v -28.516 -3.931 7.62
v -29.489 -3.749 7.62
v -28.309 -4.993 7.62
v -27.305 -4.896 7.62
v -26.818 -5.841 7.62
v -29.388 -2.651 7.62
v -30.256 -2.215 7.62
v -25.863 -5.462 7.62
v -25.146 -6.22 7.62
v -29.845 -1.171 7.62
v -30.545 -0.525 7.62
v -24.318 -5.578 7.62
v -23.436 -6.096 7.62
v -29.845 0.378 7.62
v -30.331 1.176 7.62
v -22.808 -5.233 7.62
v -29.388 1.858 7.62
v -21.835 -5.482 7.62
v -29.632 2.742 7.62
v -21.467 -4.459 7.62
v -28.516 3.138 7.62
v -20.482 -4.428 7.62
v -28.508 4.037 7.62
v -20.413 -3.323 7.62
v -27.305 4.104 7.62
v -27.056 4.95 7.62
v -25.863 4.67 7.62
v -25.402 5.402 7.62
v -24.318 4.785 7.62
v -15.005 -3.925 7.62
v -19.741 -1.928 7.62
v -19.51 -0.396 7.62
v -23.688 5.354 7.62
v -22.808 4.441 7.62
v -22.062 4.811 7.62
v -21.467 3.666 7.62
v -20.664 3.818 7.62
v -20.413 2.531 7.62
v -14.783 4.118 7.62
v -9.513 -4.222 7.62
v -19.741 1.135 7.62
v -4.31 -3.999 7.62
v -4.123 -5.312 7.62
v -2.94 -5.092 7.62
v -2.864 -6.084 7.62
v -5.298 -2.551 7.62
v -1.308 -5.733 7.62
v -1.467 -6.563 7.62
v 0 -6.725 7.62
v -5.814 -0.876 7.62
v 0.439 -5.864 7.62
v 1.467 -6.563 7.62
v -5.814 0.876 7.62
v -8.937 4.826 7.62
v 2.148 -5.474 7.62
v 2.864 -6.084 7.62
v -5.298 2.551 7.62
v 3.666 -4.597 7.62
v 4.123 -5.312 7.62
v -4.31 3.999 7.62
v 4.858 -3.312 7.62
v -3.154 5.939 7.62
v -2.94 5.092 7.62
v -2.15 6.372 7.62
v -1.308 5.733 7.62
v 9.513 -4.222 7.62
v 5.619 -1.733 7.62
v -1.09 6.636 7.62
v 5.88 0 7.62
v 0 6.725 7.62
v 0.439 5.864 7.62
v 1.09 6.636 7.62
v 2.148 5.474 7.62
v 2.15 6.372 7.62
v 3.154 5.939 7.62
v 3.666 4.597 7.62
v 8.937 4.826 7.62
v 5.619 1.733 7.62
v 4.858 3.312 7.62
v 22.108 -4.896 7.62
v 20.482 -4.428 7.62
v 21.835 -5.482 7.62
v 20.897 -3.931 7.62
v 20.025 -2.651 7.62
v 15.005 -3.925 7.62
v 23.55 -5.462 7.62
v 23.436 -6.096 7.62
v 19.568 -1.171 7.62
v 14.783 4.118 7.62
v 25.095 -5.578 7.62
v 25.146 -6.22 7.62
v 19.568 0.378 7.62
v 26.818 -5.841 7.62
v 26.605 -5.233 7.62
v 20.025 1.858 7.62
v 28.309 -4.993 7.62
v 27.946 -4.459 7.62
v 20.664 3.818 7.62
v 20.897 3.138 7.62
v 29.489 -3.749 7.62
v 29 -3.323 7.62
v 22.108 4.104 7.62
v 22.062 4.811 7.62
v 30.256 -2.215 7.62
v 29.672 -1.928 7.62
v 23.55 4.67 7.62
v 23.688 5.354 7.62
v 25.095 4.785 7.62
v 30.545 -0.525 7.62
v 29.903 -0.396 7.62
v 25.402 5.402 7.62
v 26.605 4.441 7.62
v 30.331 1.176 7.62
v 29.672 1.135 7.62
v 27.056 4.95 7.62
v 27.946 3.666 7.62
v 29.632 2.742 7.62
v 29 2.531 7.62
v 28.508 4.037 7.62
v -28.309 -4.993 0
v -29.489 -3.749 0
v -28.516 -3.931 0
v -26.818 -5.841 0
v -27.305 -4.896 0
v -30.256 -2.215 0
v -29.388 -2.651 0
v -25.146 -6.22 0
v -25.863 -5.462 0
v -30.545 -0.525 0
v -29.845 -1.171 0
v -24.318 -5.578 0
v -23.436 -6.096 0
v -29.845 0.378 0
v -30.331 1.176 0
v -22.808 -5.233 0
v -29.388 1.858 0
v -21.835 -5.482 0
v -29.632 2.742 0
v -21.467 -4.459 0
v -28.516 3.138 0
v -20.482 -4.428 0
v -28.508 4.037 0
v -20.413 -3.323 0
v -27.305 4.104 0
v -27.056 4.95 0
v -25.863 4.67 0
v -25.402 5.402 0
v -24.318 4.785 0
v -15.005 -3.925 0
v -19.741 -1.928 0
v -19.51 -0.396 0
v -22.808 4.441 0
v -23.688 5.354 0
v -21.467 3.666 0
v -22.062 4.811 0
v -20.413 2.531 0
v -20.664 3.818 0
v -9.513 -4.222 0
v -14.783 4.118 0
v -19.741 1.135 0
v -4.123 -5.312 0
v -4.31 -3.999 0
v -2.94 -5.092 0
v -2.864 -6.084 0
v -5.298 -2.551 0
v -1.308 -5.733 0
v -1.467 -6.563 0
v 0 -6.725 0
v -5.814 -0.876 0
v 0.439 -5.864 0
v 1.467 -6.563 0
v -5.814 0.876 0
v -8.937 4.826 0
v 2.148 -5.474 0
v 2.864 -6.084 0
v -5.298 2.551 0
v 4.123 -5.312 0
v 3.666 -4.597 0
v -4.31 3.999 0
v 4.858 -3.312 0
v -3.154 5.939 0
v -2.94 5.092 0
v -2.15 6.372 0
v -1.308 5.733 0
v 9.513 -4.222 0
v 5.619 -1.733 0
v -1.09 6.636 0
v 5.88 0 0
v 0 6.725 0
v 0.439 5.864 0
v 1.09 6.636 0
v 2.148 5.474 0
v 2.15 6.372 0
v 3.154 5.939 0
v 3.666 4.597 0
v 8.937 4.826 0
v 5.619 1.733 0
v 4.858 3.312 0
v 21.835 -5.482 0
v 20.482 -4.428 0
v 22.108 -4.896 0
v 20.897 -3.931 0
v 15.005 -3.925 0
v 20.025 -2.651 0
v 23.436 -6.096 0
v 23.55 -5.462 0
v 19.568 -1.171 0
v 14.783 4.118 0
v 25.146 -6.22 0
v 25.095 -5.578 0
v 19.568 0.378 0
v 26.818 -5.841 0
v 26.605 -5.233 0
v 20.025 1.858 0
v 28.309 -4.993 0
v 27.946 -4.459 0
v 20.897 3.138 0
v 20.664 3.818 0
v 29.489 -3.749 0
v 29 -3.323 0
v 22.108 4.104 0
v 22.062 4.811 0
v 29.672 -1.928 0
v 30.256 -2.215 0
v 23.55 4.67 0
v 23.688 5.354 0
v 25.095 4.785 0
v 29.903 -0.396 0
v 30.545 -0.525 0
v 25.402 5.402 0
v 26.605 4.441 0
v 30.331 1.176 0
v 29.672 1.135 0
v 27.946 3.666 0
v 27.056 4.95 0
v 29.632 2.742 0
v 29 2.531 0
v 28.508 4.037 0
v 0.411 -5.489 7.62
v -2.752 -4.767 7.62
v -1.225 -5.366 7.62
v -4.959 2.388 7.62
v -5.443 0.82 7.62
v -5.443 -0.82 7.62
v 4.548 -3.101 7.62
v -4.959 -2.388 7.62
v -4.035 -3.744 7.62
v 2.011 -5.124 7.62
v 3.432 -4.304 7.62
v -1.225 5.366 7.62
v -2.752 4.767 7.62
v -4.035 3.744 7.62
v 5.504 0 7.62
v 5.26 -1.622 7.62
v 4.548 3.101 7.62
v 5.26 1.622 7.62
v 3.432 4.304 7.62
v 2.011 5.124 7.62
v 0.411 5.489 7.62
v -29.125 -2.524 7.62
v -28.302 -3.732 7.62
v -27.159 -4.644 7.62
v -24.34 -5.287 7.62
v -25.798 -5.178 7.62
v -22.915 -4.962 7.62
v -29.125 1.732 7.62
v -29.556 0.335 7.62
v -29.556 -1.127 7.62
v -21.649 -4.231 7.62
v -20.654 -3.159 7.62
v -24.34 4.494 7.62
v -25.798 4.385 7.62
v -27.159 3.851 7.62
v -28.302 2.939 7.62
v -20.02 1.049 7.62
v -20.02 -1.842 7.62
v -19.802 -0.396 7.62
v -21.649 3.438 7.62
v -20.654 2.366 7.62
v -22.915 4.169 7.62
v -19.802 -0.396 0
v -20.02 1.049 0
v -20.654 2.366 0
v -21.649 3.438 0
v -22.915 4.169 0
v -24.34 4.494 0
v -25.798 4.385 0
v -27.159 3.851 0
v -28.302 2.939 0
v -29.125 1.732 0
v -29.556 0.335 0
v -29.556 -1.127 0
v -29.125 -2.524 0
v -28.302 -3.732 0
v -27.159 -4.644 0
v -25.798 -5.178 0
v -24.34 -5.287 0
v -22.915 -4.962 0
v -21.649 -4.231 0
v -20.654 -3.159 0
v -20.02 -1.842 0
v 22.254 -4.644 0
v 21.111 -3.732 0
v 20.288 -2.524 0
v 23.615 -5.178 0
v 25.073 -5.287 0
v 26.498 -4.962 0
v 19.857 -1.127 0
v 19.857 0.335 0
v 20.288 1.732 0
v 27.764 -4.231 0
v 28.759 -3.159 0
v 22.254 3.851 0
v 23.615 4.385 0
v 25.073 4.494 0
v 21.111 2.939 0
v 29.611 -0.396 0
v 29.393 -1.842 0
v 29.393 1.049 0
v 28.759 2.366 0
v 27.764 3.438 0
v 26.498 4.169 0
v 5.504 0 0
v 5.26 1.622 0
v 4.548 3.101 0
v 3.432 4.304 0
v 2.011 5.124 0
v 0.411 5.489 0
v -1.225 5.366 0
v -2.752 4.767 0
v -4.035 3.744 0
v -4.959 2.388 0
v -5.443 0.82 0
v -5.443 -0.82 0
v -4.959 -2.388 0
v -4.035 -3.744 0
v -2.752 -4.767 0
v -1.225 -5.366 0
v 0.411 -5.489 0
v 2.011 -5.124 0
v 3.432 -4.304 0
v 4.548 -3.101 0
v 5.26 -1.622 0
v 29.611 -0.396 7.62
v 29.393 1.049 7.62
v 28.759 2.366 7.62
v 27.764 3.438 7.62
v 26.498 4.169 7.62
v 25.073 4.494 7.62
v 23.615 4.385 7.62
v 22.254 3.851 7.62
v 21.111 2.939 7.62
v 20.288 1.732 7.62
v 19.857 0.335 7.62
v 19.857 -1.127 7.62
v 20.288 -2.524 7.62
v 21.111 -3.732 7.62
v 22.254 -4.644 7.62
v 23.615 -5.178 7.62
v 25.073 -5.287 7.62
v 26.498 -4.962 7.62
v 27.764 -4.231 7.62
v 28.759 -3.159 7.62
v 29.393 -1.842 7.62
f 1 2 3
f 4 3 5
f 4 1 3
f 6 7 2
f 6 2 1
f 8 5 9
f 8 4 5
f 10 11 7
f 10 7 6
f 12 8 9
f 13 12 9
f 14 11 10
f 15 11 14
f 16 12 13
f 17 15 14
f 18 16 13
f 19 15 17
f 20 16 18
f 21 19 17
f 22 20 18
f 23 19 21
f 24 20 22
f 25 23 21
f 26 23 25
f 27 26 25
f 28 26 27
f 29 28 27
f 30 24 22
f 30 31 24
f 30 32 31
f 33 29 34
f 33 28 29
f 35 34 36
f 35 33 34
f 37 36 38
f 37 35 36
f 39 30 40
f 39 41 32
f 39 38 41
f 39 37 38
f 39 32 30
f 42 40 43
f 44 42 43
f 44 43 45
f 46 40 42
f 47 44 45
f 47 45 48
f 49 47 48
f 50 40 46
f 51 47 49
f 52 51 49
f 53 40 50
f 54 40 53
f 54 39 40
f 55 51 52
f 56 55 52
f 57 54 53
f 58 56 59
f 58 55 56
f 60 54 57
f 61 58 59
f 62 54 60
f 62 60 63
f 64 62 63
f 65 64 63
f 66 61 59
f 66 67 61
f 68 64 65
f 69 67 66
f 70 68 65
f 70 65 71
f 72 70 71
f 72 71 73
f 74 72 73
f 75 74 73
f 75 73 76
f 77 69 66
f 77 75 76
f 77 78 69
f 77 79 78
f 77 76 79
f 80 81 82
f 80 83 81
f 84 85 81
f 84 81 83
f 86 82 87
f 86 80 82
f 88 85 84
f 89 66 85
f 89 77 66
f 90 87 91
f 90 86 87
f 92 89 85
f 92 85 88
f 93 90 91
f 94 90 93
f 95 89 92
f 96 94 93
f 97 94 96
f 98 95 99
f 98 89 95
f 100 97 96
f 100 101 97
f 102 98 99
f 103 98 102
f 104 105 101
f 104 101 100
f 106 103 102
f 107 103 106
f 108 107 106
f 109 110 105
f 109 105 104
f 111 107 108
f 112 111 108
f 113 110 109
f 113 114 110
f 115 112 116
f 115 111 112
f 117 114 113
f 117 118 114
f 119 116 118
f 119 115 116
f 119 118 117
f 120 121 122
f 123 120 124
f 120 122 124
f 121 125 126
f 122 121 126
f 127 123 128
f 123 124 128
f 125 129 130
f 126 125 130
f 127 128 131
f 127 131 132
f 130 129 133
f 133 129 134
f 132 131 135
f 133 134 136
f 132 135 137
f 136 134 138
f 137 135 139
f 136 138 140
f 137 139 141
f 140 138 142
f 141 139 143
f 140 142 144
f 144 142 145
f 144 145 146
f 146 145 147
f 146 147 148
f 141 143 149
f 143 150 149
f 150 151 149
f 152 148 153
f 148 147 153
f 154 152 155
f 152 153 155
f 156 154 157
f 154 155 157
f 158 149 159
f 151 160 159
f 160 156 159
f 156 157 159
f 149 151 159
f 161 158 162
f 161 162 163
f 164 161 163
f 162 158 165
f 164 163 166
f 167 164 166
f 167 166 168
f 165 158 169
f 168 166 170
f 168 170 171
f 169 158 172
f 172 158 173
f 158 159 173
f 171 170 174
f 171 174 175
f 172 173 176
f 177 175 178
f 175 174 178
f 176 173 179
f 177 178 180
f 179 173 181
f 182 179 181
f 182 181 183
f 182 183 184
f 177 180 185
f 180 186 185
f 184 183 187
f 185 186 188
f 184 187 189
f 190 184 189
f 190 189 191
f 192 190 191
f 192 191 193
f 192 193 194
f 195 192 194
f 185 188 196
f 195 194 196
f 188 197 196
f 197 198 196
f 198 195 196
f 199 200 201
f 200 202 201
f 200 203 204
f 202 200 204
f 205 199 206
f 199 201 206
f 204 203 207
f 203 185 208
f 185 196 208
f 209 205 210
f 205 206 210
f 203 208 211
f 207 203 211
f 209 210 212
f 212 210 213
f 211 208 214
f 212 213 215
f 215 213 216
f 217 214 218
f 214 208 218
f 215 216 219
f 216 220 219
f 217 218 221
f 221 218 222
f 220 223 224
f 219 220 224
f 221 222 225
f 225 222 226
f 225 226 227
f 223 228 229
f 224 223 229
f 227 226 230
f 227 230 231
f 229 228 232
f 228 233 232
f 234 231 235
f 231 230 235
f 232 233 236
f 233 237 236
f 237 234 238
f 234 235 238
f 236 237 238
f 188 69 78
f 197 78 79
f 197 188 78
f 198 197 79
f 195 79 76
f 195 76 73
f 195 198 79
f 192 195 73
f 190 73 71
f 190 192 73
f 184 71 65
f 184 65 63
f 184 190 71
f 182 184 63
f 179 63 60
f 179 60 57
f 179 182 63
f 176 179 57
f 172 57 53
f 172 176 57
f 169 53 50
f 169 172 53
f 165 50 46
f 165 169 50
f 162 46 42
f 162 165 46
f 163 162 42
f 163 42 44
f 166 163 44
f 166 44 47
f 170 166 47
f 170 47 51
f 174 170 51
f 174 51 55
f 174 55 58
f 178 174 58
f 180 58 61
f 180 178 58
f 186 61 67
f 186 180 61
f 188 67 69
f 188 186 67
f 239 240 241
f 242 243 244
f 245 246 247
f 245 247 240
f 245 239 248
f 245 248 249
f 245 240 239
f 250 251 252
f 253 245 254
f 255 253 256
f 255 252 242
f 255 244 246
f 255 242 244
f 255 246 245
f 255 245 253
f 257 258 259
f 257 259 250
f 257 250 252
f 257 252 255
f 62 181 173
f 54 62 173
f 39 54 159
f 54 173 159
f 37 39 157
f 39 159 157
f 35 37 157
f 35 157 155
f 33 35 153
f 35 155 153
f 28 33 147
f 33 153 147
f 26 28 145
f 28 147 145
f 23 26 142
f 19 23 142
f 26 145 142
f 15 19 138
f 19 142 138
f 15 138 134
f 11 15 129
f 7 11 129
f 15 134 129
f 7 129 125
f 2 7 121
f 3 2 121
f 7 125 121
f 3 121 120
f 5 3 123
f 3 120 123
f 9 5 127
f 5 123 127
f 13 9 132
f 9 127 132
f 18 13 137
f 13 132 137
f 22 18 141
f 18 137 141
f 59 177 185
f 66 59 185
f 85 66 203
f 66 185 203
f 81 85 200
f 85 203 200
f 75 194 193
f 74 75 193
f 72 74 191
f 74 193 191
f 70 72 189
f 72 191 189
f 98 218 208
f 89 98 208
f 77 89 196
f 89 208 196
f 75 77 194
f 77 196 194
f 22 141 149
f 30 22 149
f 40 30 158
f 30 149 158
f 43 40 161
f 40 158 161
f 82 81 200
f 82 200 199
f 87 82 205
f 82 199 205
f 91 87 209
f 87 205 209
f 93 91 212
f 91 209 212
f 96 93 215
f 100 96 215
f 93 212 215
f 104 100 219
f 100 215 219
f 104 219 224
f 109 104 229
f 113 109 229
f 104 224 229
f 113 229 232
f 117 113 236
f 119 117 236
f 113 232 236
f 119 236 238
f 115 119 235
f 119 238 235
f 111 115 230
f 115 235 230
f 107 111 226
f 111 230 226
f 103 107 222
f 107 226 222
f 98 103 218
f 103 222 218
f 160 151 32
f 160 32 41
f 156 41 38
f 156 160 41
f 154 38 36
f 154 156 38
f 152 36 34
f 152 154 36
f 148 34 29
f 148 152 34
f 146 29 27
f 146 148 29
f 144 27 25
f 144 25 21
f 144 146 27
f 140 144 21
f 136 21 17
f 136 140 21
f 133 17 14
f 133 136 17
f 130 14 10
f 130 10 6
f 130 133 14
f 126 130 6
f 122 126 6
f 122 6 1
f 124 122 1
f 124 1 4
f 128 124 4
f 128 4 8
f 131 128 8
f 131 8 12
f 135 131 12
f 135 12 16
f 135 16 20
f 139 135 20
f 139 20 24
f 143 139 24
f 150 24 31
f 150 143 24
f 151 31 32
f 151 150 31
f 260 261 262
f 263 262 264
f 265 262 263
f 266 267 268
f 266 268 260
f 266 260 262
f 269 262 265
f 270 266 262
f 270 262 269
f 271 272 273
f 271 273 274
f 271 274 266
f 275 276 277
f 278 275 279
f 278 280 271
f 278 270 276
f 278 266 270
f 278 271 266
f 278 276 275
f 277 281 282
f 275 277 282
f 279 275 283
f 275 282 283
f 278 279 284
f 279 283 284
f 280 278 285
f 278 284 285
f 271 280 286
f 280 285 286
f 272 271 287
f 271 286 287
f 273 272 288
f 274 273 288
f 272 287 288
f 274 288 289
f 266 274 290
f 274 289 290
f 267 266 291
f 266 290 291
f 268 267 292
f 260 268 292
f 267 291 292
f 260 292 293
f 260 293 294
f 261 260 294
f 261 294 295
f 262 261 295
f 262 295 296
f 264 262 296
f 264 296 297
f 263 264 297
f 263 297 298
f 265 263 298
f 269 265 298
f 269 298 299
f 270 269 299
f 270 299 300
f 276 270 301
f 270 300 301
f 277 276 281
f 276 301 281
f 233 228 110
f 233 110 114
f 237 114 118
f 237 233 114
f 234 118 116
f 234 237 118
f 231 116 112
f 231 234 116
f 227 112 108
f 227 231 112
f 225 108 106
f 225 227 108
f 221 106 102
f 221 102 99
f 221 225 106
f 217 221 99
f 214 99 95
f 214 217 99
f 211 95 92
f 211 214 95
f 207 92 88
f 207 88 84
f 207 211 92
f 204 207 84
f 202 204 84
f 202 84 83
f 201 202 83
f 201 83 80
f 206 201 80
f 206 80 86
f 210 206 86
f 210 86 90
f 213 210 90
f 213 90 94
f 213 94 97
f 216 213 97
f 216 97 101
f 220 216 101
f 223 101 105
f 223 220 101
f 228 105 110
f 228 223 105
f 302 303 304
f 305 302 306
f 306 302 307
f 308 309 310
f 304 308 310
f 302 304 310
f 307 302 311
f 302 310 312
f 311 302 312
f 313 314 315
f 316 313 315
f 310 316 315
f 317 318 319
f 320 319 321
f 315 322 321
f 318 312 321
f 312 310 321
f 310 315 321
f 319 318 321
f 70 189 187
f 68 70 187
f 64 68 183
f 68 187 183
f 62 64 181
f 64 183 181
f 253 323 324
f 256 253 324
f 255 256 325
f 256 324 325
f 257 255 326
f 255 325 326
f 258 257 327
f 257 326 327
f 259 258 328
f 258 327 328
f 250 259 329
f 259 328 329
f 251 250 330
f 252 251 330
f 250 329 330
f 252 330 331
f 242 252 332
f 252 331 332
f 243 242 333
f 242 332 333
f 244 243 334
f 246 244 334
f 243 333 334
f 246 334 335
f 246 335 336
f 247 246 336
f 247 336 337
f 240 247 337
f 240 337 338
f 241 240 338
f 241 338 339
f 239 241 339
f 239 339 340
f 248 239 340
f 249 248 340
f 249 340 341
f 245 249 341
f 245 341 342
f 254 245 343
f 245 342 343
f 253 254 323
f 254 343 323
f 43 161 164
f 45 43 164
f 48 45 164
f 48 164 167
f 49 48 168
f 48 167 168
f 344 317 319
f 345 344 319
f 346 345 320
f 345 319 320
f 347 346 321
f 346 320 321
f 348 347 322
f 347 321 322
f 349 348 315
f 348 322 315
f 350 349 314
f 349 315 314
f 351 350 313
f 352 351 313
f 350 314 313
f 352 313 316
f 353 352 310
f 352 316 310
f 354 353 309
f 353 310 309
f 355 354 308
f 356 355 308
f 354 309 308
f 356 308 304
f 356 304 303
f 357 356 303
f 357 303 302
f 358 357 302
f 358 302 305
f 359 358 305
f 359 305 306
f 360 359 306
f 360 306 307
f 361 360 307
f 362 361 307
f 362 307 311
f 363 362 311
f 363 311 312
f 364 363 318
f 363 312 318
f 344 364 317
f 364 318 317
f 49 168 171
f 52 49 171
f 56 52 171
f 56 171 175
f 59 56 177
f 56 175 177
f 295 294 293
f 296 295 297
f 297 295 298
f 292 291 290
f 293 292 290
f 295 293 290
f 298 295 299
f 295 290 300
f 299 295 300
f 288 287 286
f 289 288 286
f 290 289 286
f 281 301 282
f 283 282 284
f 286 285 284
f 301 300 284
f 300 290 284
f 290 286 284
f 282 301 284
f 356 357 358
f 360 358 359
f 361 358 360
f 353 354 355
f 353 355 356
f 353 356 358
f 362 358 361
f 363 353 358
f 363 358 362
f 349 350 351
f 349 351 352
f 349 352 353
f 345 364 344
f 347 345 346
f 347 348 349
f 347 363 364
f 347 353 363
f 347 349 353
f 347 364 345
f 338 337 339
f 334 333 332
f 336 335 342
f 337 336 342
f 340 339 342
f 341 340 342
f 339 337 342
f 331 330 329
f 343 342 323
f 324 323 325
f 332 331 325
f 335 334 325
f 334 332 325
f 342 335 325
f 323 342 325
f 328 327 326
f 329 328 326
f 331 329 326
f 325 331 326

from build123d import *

# Parameters (mm, degrees)
F0_R     = 5.1963002221
F0_R_2   = 5.8800950513
F1_DEPTH = 7.62
F0_R_3   = 5.5044911899
F0_R_4   = 4.9042601262


# Not quite as in the source:
# - a feature names something its author has since deleted; it is built from what else it names


with BuildPart() as f1:
    # F0 (on Top) → F1 (new body)
    with BuildSketch(Plane.XY):
        with BuildLine():
            ThreePointArc((-3.1544311234, 5.9388807954), (-1.573442924, 6.3166135062), (0, 6.7246368537))
            ThreePointArc((0, 6.7246368537), (-1.6254113553, 6.5252416614), (-3.1544311234, 5.9388807954))
        make_face()
        with BuildLine():
            ThreePointArc((0, 6.7246368537), (1.573442924, 6.3166135062), (3.1544311234, 5.9388807954))
            ThreePointArc((3.1544311234, 5.9388807954), (1.6254113553, 6.5252416614), (0, 6.7246368537))
        make_face()
        with BuildLine():
            ThreePointArc((0, -6.7246368537), (2.1790400303, -6.3618020529), (4.1229353018, -5.3124519114))
            ThreePointArc((4.1229353018, -5.3124519114), (2.0411071075, -5.9591008914), (0, -6.7246368537))
        make_face()
        with BuildLine():
            ThreePointArc((-4.1229353018, -5.3124519114), (-2.1790400303, -6.3618020529), (0, -6.7246368537))
            ThreePointArc((0, -6.7246368537), (-2.0411071075, -5.9591008914), (-4.1229353018, -5.3124519114))
        make_face()
        with BuildLine():
            ThreePointArc((-4.1229353018, -5.3124519114), (-6.6998610017, 0.5767177582), (-3.1544311234, 5.9388807954))
            ThreePointArc((-3.1544311234, 5.9388807954), (-11.8536034806, 4.4211029843), (-20.6635650247, 3.8179224357))
            ThreePointArc((-20.6635650247, 3.8179224357), (-30.545156174, -0.5250277146), (-20.481782034, -4.4283033349))
            ThreePointArc((-20.481782034, -4.4283033349), (-12.2539035705, -3.9738433369), (-4.1229353018, -5.3124519114))
        make_face()
        with Locations((-24.706566421, -0.3963195836)):
            Circle(F0_R, mode=Mode.SUBTRACT)
        with BuildLine():
            ThreePointArc((3.1544311234, 5.9388807954), (5.7633820192, 3.4647032362), (6.7246368537, 0))
            ThreePointArc((6.7246368537, 0), (6.0392873541, -2.9576593903), (4.1229353018, -5.3124519114))
            ThreePointArc((4.1229353018, -5.3124519114), (12.2539035705, -3.9738433369), (20.481782034, -4.4283033349))
            ThreePointArc((20.481782034, -4.4283033349), (30.545156174, -0.5250277146), (20.6635650247, 3.8179224357))
            ThreePointArc((20.6635650247, 3.8179224357), (11.8536034806, 4.4211029843), (3.1544311234, 5.9388807954))
        make_face()
        with Locations((24.706566421, -0.3963195836)):
            Circle(F0_R, mode=Mode.SUBTRACT)
        with BuildLine():
            ThreePointArc((4.1229353018, -5.3124519114), (6.0392873541, -2.9576593903), (6.7246368537, 0))
            ThreePointArc((6.7246368537, 0), (5.7633820192, 3.4647032362), (3.1544311234, 5.9388807954))
            ThreePointArc((3.1544311234, 5.9388807954), (1.573442924, 6.3166135062), (0, 6.7246368537))
            ThreePointArc((0, 6.7246368537), (-1.573442924, 6.3166135062), (-3.1544311234, 5.9388807954))
            ThreePointArc((-3.1544311234, 5.9388807954), (-6.6998610017, 0.5767177582), (-4.1229353018, -5.3124519114))
            ThreePointArc((-4.1229353018, -5.3124519114), (-2.0411071075, -5.9591008914), (0, -6.7246368537))
            ThreePointArc((0, -6.7246368537), (2.0411071075, -5.9591008914), (4.1229353018, -5.3124519114))
        make_face()
        Circle(F0_R_2, mode=Mode.SUBTRACT)
    extrude(amount=F1_DEPTH)


with BuildPart() as f1b:
    # F0 (on Top) → F1, piece 2 (new body)
    with BuildSketch(Plane.XY):
        Circle(F0_R_3)
    extrude(amount=F1_DEPTH)


with BuildPart() as f1c:
    # F0 (on Top) → F1, piece 3 (new body)
    with BuildSketch(Plane.XY):
        with Locations((24.706566421, -0.3963195836)):
            Circle(F0_R_4)
    extrude(amount=F1_DEPTH)


with BuildPart() as f1d:
    # F0 (on Top) → F1, piece 4 (new body)
    with BuildSketch(Plane.XY):
        with Locations((-24.706566421, -0.3963195836)):
            Circle(F0_R_4)
    extrude(amount=F1_DEPTH)


solid = Compound([f1.part, f1b.part, f1c.part, f1d.part])
